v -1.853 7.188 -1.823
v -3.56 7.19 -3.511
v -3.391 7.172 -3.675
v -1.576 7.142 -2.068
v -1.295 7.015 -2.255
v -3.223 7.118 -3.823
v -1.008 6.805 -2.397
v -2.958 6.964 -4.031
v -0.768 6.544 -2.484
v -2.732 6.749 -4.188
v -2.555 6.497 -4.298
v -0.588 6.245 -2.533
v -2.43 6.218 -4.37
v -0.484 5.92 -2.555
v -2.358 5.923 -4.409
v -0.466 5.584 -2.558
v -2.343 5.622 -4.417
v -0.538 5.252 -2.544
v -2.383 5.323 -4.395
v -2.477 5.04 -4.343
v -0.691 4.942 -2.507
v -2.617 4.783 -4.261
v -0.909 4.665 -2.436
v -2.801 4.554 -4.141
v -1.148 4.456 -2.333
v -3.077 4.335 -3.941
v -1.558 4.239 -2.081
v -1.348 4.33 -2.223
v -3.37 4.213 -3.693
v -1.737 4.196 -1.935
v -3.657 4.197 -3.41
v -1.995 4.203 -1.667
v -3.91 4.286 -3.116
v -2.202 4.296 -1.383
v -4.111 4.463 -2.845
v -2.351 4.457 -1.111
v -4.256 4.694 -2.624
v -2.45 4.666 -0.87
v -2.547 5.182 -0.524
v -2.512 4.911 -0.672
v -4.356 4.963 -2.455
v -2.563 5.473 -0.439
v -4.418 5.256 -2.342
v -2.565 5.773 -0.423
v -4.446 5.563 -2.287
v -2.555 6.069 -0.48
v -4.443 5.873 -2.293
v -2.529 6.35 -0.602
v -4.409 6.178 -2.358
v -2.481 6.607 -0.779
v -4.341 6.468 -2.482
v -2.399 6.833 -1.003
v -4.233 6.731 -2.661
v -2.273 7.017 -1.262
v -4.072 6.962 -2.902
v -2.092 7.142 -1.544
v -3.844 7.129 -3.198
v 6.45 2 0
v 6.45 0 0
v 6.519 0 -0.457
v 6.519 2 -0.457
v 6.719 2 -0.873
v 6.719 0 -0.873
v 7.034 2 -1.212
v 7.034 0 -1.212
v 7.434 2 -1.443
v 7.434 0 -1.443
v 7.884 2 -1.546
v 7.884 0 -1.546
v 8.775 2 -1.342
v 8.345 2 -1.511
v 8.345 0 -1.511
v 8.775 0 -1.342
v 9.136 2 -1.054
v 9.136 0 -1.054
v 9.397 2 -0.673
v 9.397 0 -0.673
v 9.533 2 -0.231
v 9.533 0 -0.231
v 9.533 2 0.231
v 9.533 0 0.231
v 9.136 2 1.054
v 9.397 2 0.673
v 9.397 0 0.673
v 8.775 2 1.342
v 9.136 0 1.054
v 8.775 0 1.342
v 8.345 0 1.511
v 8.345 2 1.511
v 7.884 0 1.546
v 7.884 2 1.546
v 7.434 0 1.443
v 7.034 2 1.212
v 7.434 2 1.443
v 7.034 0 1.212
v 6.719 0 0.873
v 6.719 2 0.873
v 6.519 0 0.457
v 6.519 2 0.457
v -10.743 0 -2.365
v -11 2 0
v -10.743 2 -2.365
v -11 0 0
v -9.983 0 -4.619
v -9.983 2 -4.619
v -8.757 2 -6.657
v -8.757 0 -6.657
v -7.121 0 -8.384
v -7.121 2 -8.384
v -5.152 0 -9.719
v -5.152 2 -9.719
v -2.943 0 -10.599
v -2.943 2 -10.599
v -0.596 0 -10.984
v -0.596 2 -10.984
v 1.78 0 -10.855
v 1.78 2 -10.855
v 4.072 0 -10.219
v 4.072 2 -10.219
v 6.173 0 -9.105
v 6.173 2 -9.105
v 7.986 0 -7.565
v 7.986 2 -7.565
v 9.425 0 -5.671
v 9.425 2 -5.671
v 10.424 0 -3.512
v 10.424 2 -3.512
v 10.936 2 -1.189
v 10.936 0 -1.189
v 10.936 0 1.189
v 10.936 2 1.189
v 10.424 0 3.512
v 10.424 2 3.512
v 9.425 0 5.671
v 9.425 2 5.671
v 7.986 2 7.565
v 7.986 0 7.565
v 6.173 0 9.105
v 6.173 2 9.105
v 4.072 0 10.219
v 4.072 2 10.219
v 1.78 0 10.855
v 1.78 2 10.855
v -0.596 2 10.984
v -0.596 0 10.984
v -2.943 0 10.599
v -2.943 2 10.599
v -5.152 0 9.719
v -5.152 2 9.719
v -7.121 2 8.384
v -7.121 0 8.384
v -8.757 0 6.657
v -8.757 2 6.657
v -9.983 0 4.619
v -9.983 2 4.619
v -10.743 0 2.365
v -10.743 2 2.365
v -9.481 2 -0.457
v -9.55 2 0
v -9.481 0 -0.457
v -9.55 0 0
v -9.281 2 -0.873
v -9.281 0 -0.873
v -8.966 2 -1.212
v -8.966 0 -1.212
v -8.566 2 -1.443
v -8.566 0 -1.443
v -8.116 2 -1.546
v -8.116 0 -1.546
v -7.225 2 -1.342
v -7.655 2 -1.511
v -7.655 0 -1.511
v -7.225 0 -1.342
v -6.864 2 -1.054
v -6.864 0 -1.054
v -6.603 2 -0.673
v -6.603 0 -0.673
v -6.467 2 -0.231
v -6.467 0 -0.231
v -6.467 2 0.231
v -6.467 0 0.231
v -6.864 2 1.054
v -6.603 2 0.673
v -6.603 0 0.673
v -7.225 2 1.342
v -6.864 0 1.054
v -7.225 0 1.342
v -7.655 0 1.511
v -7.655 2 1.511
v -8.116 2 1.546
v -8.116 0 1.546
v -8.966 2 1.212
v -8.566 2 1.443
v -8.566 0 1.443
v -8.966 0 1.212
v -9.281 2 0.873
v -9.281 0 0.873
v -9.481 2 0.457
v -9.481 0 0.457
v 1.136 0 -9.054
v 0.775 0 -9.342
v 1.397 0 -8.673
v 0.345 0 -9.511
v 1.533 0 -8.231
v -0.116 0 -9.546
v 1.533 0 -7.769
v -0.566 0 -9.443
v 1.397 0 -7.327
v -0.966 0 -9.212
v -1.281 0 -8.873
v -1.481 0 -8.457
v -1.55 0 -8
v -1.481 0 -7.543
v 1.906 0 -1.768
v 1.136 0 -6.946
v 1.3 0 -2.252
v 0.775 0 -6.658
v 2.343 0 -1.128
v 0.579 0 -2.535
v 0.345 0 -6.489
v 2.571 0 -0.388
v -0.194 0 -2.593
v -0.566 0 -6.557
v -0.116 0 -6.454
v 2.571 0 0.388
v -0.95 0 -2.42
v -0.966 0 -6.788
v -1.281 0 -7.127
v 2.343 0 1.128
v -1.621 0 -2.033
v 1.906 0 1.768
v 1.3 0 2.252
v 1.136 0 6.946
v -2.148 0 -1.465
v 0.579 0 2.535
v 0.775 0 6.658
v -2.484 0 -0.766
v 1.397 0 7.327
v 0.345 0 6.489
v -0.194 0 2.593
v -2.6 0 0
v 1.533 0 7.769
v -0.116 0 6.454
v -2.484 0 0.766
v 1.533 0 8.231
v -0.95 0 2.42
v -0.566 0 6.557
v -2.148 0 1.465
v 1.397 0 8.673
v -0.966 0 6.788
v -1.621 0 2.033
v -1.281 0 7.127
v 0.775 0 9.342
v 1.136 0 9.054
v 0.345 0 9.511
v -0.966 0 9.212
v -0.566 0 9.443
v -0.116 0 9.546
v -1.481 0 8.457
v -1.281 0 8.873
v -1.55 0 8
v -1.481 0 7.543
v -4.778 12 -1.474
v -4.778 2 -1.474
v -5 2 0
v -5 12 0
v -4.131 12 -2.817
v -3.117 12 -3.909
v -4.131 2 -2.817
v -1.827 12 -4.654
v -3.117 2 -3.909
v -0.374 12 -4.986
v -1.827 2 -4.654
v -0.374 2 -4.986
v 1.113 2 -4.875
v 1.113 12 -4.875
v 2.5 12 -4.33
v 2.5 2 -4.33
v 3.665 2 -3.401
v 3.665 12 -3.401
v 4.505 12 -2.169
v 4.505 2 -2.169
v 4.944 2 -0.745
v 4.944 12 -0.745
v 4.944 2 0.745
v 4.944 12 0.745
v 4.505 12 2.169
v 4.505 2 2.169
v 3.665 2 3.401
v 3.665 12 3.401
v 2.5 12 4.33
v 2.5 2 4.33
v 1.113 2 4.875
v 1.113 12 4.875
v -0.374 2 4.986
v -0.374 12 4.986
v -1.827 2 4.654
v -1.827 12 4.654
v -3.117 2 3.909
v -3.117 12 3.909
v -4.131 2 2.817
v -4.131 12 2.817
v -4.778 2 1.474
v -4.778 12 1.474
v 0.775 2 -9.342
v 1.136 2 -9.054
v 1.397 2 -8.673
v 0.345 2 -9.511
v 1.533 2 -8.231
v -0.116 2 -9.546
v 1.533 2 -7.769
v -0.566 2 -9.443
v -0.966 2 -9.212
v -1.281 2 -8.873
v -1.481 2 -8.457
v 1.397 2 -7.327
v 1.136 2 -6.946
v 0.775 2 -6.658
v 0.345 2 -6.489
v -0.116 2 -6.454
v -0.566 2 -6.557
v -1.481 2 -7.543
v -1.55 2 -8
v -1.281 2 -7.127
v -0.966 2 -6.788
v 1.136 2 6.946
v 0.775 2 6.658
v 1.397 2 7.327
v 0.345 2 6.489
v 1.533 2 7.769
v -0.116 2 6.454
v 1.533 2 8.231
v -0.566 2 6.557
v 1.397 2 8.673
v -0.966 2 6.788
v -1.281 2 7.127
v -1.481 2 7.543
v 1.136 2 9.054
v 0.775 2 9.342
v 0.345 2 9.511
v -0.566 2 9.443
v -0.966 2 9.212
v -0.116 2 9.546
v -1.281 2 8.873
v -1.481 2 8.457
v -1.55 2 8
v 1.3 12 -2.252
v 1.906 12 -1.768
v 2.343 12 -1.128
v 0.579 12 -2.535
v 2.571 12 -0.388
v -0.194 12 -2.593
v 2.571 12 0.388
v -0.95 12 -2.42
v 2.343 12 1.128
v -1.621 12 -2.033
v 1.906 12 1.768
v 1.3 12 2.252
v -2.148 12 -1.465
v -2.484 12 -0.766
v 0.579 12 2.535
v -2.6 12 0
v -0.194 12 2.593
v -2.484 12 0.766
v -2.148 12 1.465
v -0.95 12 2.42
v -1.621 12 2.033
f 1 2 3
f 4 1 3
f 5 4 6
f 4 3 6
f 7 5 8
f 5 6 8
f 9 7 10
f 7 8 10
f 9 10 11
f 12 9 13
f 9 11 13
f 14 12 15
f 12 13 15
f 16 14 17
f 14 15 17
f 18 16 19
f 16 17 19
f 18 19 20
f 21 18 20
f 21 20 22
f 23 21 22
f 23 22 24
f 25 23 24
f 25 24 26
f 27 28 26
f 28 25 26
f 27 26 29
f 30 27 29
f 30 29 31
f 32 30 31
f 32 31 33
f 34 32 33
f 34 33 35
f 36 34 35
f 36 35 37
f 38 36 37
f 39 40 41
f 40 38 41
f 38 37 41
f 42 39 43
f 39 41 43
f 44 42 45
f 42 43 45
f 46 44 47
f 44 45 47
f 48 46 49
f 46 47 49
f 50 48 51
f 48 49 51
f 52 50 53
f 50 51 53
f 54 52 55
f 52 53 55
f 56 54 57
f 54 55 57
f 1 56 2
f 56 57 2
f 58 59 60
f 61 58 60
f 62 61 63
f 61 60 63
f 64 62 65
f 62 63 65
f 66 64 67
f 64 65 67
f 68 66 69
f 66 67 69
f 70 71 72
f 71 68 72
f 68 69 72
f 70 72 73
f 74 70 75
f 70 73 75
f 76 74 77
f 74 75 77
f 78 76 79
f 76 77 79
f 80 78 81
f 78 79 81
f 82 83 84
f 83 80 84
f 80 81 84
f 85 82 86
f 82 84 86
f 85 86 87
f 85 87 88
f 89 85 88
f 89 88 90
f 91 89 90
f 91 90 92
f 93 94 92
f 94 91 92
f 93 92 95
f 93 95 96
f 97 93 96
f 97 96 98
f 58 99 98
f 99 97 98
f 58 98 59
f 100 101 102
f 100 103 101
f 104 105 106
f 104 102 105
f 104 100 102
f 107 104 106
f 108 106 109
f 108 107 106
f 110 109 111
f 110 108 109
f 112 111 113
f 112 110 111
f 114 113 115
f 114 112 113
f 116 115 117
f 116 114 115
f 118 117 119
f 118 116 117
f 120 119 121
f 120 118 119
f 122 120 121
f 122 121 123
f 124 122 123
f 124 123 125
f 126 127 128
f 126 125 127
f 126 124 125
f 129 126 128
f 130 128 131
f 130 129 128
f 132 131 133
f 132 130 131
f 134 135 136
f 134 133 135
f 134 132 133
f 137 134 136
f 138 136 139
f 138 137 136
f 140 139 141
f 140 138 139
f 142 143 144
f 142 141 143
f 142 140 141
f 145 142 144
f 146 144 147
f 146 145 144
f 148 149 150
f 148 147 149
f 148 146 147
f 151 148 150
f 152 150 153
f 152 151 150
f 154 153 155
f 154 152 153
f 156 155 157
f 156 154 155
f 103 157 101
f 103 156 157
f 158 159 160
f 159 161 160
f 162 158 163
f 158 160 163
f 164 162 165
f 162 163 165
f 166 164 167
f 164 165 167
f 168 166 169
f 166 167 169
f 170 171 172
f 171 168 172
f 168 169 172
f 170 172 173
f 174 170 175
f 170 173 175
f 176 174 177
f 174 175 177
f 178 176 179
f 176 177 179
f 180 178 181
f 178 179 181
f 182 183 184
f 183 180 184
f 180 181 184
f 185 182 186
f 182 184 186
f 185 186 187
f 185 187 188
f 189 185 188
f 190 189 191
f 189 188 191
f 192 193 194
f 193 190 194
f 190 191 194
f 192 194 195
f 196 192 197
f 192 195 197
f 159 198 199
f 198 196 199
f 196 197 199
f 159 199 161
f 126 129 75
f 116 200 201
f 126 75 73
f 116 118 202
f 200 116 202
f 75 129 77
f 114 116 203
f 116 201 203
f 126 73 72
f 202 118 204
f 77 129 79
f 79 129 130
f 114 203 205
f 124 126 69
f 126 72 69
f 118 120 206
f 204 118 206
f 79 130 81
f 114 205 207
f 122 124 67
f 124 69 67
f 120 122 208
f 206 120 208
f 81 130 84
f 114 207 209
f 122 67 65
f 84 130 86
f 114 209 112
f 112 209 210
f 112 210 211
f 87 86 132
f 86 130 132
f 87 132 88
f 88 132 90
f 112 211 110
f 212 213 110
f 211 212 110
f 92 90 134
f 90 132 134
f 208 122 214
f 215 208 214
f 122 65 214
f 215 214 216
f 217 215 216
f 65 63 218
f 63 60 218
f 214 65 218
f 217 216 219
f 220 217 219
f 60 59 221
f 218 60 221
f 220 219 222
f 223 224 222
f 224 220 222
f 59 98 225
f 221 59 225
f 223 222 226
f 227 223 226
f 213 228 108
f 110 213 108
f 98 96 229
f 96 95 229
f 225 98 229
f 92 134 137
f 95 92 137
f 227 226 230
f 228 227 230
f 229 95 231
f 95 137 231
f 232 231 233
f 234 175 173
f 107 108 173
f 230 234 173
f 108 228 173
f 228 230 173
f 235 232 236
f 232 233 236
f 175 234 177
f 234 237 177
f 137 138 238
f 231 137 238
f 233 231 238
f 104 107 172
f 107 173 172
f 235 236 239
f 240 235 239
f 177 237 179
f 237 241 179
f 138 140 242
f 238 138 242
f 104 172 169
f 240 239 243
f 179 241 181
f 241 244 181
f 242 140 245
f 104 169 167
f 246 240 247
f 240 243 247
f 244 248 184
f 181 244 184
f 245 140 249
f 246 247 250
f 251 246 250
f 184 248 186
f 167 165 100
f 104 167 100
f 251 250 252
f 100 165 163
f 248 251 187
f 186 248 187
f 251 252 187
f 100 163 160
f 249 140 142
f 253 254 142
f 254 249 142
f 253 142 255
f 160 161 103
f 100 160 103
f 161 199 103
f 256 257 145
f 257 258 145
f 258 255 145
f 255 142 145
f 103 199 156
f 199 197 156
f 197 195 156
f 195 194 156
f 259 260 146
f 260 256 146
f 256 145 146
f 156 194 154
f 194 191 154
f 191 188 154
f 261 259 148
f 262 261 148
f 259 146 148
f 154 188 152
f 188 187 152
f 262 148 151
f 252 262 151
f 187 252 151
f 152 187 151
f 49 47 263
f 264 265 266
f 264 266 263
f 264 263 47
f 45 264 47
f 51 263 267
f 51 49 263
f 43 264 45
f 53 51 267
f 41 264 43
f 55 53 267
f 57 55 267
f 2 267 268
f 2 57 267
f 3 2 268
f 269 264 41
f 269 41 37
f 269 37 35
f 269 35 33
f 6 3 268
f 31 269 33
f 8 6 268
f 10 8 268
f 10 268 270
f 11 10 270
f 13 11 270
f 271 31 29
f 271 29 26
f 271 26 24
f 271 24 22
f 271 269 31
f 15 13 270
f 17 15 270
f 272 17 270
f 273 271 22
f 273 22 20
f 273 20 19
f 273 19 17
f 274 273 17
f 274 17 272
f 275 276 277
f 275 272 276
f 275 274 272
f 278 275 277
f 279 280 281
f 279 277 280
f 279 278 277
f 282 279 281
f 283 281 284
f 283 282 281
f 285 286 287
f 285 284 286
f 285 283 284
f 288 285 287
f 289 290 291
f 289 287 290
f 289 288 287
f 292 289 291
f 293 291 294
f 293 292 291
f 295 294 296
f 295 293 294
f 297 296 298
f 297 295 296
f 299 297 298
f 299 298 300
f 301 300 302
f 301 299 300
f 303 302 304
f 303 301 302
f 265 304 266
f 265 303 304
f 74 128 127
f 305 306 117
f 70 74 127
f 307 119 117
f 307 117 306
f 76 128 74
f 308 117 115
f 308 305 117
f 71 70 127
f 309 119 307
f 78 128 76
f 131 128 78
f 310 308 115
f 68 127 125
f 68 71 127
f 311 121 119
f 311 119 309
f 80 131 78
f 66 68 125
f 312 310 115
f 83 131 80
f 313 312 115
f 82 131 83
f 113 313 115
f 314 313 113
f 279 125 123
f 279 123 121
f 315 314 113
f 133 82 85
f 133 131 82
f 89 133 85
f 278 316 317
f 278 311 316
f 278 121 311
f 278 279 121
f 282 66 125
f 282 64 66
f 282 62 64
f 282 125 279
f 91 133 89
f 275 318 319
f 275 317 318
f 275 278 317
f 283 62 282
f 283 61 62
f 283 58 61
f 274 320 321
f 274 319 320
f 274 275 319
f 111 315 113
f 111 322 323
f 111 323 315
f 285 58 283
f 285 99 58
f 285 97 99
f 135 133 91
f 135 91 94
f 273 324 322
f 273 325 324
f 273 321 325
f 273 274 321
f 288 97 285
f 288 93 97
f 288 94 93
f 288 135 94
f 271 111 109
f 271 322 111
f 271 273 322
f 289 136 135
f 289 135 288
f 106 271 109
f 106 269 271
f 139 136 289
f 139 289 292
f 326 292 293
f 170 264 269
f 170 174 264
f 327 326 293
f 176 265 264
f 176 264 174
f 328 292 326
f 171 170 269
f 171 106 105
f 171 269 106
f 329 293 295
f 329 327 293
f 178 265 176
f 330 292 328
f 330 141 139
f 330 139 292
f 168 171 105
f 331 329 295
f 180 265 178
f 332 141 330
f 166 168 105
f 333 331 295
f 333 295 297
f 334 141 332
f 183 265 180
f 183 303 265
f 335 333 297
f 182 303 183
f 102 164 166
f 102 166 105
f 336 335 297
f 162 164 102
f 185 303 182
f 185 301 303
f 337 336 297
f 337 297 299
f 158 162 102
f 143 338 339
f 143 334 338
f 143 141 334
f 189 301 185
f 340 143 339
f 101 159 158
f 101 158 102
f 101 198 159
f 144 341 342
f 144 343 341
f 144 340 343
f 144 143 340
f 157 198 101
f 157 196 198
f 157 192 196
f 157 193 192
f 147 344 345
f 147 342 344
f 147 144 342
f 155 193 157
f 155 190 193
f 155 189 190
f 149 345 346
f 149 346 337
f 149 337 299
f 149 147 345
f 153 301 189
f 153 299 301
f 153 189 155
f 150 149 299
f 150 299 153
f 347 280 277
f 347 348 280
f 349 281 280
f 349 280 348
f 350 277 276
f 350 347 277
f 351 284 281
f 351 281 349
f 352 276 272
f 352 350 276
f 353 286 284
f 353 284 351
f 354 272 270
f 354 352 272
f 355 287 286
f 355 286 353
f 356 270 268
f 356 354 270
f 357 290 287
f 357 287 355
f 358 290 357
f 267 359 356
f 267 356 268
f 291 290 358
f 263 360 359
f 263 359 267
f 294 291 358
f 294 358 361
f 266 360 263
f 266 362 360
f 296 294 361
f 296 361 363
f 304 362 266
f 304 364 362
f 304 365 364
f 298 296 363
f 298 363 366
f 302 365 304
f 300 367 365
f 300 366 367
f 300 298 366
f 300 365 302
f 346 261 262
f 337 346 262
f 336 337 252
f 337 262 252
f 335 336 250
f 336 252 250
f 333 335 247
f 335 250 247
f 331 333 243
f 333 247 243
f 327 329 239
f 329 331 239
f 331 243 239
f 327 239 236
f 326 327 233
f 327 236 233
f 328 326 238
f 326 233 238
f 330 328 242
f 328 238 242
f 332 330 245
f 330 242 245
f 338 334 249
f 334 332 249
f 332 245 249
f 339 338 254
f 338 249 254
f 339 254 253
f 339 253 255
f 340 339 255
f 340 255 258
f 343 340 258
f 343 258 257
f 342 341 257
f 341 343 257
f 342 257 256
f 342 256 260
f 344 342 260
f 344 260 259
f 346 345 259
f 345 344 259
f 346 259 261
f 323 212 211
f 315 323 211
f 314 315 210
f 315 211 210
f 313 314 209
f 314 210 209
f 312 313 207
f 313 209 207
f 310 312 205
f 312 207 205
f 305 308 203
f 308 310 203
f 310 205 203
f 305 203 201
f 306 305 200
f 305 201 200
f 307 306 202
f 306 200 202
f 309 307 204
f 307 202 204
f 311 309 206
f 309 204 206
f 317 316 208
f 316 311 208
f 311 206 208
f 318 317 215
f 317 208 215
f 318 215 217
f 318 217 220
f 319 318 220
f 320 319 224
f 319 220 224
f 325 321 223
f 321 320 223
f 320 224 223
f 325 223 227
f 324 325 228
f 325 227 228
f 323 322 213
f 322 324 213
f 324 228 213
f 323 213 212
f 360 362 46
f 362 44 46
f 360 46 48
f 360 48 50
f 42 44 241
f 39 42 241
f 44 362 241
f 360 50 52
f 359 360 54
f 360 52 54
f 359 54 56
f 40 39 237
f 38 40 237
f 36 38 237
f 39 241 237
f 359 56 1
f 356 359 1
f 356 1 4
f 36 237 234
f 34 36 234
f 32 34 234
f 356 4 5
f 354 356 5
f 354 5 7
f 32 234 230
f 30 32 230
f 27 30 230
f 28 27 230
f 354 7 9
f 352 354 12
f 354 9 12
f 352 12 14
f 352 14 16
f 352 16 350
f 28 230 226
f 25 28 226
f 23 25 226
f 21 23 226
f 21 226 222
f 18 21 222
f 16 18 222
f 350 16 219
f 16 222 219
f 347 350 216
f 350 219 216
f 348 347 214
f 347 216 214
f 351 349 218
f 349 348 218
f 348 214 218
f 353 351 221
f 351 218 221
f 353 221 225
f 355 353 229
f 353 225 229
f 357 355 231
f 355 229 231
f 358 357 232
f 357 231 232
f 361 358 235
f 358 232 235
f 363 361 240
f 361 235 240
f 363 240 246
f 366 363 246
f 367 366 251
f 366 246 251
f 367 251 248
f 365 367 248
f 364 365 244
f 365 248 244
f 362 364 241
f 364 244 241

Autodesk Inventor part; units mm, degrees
ref_plane "YZ Plane" through (0, 0, 0) normal (1, 0, 0) x (0, 1, 0)
ref_plane "XZ Plane" through (0, 0, 0) normal (0, 1, 0) x (-1, 0, 0)
sketch "Эскиз1" plane through (0, 0, 0) normal (0, 1, 0) x (-1, 0, 0)
  circle A0 centre (0, 0) radius 5
  circle A1 centre (0, 0) radius 2.6
  circle A2 centre (0, 0) radius 11
  circle A3 centre (8, 0) radius 1.55
  circle A4 centre (-8, 0) radius 1.55
  circle A5 centre (0, 8) radius 1.55
  circle A6 centre (0, -8) radius 1.55
  dimension "d0" = 5.2
  dimension "d1" = 10
  dimension "d2" = 22
  dimension "d3" = 3.1
  dimension "d4" = 3.1
  dimension "d5" = 16
  dimension "d6" = 8
  dimension "d7" = 3.1
  dimension "d8" = 3.1
  dimension "d9" = 8
  dimension "d10" = 8
  dimension "d11" = 16
extrude "Выдавливание1" add sketch "Эскиз1" along normal blind 2 contours A2
extrude "Выдавливание2" add sketch "Эскиз1" along normal blind 12 contours A0
sketch "Эскиз2" plane through (0, 0, 0) normal (1, 0, 0) x (0, 1, 0)
  point P0 (0, 0)
  point P1 (-0.4556, -12.0524)
  point P2 (8.9773, -12.0404)
sketch "Эскиз3" plane through (0, 0, 0) normal (0, 0, 1) x (1, 0, 0)
  point P0 (0, 0)
  point P1 (-11.9191, -0.1213)
  point P2 (-11.9191, 9.5232)
ref_plane "РабПлоскость1" through (0, -0.4556, -12.0524) normal (0.711, -0.0009, 0.7032) x (0, 1, 0.0013)
sketch "Эскиз4" plane through (0, -0.4556, -12.0524) normal (0.711, -0.0009, 0.7032) x (0, 1, 0.0013)
  circle A0 centre (6.1565, 8.569) radius 1.5
  point P0 (0.4709, 8.569)
  dimension "d16" = 3
extrude "Выдавливание3" cut sketch "Эскиз4" along normal up to surface
properties part number "Муфта"
